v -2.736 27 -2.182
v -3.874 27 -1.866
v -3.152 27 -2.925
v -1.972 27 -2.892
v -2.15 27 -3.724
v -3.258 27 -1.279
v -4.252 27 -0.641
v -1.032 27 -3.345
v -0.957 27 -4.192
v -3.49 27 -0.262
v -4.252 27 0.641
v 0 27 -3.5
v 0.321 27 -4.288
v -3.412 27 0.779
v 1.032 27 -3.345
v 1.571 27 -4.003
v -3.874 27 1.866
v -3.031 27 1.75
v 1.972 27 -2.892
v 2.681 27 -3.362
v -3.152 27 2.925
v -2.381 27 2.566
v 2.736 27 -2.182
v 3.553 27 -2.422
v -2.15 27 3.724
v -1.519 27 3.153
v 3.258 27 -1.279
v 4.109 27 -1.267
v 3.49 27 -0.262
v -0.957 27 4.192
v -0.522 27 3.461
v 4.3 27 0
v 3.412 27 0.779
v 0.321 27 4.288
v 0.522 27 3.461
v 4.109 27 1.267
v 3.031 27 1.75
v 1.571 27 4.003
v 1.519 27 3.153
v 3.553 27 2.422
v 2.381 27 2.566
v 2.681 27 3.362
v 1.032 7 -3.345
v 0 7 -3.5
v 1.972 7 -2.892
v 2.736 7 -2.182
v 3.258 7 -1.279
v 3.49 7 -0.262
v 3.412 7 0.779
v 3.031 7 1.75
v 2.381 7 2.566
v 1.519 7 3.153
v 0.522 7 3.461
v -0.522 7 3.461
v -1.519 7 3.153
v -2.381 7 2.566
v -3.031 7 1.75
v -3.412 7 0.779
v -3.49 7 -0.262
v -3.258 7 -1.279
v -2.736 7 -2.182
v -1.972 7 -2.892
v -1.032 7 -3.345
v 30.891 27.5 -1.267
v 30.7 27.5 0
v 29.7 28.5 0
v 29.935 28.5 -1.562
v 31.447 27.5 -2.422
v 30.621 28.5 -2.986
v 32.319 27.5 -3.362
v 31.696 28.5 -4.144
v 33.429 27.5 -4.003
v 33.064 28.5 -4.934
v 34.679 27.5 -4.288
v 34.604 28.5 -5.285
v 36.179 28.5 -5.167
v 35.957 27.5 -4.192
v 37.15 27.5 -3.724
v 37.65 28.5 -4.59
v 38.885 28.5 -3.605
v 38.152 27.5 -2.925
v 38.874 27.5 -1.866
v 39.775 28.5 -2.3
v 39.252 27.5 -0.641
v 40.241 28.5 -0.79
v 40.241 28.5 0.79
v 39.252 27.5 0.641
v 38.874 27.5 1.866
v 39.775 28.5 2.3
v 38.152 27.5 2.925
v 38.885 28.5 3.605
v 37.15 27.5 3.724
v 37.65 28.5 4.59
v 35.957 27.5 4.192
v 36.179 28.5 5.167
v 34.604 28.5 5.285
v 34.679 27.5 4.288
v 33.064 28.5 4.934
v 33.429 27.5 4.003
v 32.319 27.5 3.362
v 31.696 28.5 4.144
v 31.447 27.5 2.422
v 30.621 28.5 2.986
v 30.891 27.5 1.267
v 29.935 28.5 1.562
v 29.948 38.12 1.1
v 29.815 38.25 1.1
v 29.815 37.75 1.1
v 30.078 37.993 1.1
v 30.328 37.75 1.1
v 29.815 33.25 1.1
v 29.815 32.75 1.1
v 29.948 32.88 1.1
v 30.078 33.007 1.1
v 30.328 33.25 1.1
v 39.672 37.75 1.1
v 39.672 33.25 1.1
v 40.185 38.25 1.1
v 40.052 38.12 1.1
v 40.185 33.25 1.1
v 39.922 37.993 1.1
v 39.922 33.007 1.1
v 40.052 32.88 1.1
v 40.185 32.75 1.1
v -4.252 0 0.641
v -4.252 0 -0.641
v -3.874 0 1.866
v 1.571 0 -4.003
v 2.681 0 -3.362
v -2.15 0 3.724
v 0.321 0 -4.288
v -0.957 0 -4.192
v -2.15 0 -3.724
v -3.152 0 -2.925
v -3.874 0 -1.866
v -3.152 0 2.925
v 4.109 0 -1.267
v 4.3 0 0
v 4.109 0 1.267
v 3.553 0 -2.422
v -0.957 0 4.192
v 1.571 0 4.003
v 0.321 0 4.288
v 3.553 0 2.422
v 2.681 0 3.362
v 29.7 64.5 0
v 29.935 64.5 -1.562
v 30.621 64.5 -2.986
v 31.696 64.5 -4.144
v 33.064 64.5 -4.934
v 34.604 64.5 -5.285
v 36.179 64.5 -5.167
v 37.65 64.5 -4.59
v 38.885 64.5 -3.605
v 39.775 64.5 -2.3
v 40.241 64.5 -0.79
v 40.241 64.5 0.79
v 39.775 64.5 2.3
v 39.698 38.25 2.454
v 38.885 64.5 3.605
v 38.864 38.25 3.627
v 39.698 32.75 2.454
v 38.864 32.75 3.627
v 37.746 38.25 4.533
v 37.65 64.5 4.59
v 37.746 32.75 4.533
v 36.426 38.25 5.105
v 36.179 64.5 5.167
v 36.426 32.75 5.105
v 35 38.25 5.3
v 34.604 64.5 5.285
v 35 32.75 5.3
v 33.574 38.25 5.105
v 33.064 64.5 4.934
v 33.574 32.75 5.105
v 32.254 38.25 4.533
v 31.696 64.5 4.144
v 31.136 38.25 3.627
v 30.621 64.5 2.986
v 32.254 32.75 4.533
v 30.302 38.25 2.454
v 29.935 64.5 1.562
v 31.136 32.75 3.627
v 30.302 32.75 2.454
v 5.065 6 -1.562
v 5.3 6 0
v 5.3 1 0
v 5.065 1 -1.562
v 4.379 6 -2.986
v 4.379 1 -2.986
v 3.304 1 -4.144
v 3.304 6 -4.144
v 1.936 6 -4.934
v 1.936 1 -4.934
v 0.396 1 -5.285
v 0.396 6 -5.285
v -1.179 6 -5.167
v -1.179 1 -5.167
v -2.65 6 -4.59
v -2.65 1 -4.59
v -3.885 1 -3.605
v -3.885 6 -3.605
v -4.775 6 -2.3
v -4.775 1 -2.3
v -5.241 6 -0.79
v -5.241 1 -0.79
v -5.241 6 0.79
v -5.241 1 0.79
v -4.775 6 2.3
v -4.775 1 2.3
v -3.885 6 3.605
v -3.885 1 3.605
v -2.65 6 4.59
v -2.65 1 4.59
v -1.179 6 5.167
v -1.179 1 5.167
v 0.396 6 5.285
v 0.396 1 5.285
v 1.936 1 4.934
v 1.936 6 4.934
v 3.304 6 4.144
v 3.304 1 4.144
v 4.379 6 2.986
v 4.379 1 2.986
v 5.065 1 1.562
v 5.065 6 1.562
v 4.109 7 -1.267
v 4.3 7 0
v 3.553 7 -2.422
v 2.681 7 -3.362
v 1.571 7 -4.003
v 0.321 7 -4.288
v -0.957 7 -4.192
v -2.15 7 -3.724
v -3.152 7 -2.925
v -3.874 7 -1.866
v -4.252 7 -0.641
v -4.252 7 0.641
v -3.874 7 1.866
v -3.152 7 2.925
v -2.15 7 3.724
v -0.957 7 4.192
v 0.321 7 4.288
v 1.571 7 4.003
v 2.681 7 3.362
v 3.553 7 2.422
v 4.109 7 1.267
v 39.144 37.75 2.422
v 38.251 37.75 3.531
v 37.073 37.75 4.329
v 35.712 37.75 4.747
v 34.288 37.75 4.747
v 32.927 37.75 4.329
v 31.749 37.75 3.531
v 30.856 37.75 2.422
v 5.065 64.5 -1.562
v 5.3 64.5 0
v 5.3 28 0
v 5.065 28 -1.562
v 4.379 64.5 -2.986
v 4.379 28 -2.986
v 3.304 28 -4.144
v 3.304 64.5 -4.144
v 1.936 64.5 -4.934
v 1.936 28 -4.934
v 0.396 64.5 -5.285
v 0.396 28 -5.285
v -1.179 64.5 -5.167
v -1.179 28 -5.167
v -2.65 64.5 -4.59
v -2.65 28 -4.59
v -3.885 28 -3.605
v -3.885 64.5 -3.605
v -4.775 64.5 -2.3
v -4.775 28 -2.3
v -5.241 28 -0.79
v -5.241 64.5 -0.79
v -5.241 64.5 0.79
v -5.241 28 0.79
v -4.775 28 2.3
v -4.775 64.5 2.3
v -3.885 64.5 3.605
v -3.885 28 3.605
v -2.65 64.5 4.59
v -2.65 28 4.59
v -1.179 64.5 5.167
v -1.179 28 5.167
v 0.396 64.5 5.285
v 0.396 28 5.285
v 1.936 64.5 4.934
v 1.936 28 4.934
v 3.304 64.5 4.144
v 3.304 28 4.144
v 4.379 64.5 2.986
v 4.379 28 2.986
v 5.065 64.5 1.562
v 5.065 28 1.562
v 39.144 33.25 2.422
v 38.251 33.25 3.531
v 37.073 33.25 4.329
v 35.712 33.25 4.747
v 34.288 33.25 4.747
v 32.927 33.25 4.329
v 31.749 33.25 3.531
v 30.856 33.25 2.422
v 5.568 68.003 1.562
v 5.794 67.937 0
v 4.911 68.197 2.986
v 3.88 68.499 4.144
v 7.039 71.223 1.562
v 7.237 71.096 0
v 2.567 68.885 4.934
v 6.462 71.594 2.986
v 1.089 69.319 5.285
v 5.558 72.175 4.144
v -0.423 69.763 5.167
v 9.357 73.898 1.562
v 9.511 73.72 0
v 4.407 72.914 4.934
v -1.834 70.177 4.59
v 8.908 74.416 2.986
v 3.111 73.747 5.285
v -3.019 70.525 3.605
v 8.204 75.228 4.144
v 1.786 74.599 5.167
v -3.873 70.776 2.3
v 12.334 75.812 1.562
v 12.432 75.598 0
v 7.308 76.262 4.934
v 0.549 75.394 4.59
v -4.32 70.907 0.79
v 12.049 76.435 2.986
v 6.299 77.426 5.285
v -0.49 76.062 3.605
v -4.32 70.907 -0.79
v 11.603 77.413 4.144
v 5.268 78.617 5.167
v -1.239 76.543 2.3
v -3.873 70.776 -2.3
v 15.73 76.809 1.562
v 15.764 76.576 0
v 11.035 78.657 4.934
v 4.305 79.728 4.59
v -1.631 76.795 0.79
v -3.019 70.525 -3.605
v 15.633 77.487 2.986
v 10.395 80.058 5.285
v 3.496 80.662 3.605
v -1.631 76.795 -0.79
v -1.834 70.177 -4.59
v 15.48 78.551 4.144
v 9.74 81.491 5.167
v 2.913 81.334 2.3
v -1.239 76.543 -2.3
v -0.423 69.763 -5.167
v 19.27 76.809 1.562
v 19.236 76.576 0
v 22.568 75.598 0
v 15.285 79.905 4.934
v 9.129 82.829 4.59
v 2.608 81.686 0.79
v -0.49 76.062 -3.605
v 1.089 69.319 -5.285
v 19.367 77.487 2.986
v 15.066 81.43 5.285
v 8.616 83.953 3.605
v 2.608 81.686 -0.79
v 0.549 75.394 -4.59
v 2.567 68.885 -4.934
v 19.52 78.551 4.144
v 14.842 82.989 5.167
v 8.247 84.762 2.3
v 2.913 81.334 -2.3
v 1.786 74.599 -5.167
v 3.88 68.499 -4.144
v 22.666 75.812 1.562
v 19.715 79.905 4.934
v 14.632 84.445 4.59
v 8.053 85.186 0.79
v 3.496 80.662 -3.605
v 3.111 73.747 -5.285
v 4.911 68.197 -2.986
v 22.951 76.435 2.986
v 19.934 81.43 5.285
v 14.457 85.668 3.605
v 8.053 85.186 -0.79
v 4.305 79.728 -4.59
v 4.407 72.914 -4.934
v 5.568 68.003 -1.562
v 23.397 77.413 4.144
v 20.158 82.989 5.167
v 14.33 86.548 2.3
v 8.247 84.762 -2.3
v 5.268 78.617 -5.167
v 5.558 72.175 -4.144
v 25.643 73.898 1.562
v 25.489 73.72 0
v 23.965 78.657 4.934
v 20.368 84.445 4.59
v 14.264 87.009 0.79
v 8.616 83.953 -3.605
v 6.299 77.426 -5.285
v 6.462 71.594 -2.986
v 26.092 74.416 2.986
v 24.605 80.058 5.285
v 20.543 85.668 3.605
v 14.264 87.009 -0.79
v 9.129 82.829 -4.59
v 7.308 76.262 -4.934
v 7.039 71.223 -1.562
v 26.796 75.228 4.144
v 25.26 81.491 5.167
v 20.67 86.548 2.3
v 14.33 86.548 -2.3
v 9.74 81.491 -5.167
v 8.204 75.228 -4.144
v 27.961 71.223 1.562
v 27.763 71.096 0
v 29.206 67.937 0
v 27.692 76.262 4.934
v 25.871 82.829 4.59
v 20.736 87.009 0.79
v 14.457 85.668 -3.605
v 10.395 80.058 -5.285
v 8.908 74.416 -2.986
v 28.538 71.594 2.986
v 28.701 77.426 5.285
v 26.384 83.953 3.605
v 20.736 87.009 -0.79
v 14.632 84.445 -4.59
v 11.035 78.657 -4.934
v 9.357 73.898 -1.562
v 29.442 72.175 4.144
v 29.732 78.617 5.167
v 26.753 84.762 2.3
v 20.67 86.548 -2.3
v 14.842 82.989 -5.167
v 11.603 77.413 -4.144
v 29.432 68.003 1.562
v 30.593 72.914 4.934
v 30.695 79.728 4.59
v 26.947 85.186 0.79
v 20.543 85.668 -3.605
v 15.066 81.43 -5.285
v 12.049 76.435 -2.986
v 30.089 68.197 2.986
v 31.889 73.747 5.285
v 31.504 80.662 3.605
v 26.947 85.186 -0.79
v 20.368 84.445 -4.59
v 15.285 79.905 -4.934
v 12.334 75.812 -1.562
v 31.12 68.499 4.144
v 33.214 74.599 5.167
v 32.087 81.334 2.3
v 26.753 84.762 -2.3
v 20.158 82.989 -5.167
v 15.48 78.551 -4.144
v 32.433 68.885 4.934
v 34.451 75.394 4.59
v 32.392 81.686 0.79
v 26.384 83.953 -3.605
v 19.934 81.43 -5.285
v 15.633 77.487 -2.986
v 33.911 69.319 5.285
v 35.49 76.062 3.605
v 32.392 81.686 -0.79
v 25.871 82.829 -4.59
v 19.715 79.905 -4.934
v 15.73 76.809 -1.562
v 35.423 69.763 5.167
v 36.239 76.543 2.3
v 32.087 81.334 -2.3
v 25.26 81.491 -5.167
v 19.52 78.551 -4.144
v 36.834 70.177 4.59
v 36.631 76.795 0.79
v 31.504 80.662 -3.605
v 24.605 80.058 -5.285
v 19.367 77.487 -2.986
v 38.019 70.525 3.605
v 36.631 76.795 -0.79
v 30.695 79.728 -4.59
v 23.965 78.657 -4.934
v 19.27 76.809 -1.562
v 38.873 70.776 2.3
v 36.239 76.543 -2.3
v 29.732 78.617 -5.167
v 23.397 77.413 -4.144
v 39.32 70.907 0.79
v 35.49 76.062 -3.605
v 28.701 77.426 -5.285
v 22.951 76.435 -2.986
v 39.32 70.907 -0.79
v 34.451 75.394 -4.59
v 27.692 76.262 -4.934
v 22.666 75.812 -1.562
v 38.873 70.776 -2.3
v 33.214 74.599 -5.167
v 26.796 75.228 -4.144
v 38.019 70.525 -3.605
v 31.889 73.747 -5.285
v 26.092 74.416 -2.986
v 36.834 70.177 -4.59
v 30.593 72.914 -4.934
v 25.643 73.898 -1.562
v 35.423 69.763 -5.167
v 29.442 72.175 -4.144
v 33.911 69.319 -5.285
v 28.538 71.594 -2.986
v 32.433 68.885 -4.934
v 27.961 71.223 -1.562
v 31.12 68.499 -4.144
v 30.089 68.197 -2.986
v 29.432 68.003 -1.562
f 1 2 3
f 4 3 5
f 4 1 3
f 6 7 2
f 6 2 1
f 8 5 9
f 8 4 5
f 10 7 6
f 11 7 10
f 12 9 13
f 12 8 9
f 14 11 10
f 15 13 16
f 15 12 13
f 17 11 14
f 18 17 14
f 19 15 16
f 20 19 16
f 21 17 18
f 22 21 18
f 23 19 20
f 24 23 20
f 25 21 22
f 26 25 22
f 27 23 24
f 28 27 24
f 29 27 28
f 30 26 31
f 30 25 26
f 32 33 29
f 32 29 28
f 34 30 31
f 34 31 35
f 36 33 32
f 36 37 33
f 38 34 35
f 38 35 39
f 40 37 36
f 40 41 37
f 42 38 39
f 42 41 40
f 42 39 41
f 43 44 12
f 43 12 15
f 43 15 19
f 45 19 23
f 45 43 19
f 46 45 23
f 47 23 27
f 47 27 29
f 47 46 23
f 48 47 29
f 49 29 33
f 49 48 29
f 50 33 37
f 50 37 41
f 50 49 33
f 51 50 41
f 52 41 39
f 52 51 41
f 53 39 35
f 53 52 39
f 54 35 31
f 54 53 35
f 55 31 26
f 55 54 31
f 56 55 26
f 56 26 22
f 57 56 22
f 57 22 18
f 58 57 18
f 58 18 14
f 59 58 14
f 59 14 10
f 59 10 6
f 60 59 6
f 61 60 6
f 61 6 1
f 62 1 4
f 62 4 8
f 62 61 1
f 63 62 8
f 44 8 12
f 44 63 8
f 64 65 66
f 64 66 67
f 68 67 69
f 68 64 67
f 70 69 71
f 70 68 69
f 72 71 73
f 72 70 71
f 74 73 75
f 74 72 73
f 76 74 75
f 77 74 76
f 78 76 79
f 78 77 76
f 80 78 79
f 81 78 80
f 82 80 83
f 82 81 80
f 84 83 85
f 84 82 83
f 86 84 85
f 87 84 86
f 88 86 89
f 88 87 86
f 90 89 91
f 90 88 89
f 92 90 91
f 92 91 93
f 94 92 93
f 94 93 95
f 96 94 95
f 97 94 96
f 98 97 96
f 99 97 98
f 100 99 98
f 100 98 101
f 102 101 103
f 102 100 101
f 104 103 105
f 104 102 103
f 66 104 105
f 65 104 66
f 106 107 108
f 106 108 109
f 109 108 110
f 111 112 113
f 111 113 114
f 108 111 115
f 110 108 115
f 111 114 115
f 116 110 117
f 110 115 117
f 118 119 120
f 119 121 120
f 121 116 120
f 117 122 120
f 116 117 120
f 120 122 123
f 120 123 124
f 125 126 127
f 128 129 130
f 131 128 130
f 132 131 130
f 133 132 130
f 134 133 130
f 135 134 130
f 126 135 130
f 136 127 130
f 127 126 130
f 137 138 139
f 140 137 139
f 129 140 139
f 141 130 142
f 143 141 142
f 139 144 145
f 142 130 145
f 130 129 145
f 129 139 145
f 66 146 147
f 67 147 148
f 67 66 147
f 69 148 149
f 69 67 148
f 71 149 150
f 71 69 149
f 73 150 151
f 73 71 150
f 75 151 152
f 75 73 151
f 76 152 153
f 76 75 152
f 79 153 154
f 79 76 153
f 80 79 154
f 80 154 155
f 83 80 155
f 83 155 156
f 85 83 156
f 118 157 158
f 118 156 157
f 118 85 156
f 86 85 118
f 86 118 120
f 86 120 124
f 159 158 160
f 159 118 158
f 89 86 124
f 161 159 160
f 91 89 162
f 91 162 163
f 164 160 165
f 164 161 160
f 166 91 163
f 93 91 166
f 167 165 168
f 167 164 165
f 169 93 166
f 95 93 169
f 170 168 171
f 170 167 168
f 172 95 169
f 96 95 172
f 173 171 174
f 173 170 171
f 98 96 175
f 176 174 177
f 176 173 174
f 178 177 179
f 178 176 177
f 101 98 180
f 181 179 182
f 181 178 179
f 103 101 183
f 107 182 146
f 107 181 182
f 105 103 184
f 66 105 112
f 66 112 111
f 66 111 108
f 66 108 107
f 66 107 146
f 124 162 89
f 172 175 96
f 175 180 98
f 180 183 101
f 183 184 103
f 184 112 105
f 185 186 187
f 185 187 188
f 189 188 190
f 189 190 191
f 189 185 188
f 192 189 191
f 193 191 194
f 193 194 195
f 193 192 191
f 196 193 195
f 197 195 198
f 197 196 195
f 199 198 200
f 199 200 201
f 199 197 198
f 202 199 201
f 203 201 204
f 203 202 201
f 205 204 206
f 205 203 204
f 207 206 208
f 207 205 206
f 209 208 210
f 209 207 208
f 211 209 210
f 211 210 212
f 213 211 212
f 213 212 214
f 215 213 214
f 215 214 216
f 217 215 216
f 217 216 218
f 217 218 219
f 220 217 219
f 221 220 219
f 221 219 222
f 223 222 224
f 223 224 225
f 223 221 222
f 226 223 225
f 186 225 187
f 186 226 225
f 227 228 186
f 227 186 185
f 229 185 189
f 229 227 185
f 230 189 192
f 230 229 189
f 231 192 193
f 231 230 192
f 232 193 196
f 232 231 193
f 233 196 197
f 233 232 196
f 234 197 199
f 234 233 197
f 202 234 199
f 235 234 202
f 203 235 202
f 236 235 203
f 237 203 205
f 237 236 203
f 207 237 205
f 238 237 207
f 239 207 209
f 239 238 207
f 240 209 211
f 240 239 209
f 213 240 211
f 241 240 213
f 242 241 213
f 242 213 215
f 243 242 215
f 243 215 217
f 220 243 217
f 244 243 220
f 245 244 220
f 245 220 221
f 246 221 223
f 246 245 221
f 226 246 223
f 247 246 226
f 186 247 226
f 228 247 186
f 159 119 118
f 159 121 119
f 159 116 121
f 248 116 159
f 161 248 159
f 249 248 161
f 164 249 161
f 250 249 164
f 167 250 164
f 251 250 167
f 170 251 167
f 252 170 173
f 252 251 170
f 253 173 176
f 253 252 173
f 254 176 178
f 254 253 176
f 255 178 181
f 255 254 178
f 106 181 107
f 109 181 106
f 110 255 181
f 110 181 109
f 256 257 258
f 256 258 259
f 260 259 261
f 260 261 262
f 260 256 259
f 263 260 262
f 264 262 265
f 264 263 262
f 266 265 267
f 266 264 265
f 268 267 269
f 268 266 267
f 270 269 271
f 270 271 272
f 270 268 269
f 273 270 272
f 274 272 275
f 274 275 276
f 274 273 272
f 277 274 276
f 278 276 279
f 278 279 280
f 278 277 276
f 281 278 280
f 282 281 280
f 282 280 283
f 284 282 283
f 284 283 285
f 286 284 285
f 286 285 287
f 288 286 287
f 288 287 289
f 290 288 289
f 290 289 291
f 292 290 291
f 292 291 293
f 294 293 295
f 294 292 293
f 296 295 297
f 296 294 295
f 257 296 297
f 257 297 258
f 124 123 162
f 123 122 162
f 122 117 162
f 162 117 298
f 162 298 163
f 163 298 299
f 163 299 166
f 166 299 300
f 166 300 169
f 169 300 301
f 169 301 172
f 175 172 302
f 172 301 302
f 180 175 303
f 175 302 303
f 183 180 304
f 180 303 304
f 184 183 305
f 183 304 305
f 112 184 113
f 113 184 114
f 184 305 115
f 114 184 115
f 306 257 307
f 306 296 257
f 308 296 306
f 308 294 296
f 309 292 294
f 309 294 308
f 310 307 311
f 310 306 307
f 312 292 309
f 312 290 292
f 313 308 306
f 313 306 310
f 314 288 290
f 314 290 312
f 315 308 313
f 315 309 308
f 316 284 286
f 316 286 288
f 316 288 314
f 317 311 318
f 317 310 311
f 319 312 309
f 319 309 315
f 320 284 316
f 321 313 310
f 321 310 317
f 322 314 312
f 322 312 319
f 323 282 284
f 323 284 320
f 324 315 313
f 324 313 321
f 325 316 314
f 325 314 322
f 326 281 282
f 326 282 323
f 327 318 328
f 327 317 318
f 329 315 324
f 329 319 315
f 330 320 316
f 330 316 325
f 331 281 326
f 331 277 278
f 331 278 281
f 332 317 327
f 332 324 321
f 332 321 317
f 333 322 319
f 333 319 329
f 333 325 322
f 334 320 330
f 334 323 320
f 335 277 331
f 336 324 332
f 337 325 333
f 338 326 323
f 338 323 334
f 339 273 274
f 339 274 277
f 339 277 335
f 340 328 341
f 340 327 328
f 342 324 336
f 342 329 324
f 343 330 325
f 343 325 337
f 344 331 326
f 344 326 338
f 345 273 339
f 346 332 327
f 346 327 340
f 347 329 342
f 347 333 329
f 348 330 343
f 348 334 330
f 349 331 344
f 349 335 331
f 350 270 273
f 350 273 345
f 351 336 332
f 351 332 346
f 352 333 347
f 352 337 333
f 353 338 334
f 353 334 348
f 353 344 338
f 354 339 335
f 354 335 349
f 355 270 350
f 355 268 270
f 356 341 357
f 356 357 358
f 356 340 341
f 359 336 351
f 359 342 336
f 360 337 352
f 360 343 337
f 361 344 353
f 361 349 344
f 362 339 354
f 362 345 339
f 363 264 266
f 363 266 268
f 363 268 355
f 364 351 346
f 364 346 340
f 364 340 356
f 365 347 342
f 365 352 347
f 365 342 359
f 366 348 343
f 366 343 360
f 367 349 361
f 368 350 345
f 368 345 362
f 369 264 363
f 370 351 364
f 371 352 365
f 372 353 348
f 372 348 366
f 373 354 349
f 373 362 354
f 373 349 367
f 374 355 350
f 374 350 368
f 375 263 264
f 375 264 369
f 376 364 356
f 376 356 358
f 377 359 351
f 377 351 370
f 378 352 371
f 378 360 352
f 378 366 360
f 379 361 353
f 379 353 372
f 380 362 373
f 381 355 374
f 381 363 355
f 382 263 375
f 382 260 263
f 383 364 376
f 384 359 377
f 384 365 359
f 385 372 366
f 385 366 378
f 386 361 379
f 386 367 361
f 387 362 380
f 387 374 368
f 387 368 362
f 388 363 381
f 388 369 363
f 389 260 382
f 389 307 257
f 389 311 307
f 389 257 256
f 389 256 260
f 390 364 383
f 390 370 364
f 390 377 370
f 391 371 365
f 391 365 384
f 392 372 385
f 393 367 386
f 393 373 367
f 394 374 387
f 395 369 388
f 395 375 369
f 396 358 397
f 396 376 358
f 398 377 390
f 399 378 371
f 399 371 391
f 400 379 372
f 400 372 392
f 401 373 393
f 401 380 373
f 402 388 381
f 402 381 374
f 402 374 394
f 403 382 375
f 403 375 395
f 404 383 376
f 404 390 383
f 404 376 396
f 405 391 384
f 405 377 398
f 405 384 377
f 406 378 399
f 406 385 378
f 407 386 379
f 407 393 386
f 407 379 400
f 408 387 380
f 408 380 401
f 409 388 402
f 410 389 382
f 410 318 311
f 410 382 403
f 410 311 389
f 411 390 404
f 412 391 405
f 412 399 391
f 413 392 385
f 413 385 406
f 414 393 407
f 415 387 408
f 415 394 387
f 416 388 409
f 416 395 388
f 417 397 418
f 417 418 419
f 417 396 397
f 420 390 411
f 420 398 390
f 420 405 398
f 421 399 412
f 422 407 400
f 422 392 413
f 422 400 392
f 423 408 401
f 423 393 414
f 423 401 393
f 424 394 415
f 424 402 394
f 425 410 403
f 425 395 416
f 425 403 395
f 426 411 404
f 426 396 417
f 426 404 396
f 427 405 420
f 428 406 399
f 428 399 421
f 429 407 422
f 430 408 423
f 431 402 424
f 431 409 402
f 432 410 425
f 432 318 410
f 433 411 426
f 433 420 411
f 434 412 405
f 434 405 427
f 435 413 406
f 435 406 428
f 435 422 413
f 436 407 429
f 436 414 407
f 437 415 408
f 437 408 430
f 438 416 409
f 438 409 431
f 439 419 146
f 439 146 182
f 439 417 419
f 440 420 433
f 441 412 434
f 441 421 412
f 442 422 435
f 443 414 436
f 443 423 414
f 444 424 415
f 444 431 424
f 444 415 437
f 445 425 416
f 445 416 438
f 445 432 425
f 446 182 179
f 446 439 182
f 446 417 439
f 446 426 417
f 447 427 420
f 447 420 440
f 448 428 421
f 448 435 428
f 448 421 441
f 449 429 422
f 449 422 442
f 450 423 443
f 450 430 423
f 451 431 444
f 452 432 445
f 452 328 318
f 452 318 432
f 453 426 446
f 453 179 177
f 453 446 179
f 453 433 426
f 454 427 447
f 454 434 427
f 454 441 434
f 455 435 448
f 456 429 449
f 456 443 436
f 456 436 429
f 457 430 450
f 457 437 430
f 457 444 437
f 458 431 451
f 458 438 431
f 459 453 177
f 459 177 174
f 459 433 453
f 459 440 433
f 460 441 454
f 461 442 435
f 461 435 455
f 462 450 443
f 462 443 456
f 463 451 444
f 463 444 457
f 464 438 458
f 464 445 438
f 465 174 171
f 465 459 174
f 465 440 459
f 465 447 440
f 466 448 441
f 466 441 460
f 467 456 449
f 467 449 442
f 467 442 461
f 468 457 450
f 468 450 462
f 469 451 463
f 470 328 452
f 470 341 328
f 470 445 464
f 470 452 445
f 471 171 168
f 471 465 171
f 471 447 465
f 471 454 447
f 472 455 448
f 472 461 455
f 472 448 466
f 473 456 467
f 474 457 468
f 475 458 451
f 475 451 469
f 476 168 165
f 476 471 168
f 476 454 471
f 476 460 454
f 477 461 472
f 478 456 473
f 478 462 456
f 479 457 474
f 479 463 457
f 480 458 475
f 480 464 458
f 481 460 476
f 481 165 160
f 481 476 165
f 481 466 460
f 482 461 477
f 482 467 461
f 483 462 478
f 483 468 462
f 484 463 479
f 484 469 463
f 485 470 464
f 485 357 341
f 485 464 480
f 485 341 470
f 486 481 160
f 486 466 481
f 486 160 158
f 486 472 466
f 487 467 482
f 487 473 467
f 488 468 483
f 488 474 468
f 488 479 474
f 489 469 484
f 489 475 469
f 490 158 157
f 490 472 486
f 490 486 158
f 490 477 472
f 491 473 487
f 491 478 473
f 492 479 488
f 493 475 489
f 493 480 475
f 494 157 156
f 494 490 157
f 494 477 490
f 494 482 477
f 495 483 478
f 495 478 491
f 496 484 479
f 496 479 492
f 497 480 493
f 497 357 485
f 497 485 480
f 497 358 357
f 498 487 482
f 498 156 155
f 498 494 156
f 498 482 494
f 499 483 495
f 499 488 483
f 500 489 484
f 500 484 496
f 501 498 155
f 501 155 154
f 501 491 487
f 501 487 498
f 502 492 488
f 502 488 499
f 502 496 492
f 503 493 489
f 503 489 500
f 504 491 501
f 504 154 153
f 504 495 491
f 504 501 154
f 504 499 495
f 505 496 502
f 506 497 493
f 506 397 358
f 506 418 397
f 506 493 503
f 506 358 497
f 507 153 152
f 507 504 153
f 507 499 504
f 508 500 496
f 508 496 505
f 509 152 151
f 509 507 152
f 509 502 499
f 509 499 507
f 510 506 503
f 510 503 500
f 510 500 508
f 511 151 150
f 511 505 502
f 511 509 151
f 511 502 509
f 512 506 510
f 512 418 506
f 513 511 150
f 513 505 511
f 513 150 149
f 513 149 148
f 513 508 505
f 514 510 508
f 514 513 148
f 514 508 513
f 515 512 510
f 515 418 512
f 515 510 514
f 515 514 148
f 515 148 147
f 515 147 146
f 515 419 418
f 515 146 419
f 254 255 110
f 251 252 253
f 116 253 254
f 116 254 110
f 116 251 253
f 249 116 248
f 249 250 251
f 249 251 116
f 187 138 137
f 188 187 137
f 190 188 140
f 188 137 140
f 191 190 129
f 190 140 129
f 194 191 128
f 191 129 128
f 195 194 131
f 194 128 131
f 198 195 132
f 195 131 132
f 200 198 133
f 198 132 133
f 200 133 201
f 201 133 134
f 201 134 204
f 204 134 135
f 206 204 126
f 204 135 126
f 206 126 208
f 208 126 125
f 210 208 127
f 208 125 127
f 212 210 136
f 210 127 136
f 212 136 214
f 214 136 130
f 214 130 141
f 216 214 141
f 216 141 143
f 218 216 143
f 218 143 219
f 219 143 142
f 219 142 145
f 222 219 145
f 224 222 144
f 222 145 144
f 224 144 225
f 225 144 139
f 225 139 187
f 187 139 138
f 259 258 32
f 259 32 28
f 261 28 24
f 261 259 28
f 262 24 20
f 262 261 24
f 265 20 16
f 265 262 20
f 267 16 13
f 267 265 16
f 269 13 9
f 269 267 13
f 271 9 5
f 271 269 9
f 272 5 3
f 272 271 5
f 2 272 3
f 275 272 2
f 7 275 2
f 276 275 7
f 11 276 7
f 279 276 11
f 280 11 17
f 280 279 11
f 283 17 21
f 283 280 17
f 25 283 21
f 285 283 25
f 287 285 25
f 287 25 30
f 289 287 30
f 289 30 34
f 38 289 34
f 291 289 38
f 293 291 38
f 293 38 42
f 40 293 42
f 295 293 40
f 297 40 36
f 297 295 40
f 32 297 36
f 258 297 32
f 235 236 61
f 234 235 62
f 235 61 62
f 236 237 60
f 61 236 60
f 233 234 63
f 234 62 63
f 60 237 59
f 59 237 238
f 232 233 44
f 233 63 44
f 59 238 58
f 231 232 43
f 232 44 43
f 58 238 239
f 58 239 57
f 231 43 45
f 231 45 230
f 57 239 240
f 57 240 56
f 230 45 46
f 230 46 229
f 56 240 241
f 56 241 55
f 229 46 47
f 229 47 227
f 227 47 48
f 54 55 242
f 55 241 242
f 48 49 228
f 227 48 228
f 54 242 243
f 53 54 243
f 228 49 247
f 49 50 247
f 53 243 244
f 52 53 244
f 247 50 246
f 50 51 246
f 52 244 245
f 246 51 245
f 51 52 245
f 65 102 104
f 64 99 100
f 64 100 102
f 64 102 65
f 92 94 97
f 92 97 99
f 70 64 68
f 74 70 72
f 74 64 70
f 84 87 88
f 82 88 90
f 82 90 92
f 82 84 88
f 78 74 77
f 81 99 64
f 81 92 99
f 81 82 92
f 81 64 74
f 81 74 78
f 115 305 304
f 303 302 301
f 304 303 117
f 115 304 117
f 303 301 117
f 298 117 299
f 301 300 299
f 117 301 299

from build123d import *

# Parameters (mm, degrees)
SKETCH2_R          = 5.3
CUT_EXTRUDE1_START = -5.75
CUT_EXTRUDE1_DEPTH = 4.5
CUT_EXTRUDE2_START = -7
SKETCH6_R          = 5.475
SKETCH6_R_2        = 3.5
CUT_EXTRUDE2_DEPTH = 20
CHAMFER1_SIZE      = 1
CHAMFER2_SIZE      = 0.5


with BuildPart() as part:
    # Sweep1: sweep along a path in Sketch1
    with BuildLine(Plane.XY) as sweep1_path:
        Line((0, 0), (0, 64.5))
        ThreePointArc((0, 64.5), (17.5, 82), (35, 64.5))
        Line((35, 64.5), (35, 27.5))
    # Sketch2 → Sweep1 (sweep)
    with BuildSketch(Plane(origin=(0, 0, 0), x_dir=(1, 0, 0), z_dir=(0, 1, 0))):
        Circle(SKETCH2_R)
    sweep(path=sweep1_path.line)

    # Sketch4 → Cut-Extrude1 (cut)
    with BuildSketch(Plane.XZ.offset(-27.5).offset(CUT_EXTRUDE1_START)):
        with BuildLine():
            Line((29.815407441, 1.1), (40.184592559, 1.1))
            ThreePointArc((40.184592559, 1.1), (35, 5.3), (29.815407441, 1.1))
        make_face()
    extrude(amount=-CUT_EXTRUDE1_DEPTH, mode=Mode.SUBTRACT)

    # Sketch6 → Cut-Extrude2 (cut)
    with BuildSketch(Plane.XZ.offset(CUT_EXTRUDE2_START)):
        Circle(SKETCH6_R)
        with Locations(Location((0, 0, 0), (0, 0, 270))):
            Circle(SKETCH6_R_2, mode=Mode.SUBTRACT)
    extrude(amount=-CUT_EXTRUDE2_DEPTH, mode=Mode.SUBTRACT)

    # Chamfer1
    chamfer1_edges = [part.edges().sort_by_distance(p)[0] for p in [
        (40.3, 27.5, 0),
        (-5.3, 7, 0),
        (-5.3, 27, 0),
        (-5.3, 0, 0),
    ]]
    chamfer(chamfer1_edges, length=CHAMFER1_SIZE)

    # Chamfer2
    chamfer2_edges = [part.edges().sort_by_distance(p)[0] for p in [
        (35, 37.75, 5.3),
        (35, 33.25, 5.3),
    ]]
    chamfer(chamfer2_edges, length=CHAMFER2_SIZE)


solid = part.part
